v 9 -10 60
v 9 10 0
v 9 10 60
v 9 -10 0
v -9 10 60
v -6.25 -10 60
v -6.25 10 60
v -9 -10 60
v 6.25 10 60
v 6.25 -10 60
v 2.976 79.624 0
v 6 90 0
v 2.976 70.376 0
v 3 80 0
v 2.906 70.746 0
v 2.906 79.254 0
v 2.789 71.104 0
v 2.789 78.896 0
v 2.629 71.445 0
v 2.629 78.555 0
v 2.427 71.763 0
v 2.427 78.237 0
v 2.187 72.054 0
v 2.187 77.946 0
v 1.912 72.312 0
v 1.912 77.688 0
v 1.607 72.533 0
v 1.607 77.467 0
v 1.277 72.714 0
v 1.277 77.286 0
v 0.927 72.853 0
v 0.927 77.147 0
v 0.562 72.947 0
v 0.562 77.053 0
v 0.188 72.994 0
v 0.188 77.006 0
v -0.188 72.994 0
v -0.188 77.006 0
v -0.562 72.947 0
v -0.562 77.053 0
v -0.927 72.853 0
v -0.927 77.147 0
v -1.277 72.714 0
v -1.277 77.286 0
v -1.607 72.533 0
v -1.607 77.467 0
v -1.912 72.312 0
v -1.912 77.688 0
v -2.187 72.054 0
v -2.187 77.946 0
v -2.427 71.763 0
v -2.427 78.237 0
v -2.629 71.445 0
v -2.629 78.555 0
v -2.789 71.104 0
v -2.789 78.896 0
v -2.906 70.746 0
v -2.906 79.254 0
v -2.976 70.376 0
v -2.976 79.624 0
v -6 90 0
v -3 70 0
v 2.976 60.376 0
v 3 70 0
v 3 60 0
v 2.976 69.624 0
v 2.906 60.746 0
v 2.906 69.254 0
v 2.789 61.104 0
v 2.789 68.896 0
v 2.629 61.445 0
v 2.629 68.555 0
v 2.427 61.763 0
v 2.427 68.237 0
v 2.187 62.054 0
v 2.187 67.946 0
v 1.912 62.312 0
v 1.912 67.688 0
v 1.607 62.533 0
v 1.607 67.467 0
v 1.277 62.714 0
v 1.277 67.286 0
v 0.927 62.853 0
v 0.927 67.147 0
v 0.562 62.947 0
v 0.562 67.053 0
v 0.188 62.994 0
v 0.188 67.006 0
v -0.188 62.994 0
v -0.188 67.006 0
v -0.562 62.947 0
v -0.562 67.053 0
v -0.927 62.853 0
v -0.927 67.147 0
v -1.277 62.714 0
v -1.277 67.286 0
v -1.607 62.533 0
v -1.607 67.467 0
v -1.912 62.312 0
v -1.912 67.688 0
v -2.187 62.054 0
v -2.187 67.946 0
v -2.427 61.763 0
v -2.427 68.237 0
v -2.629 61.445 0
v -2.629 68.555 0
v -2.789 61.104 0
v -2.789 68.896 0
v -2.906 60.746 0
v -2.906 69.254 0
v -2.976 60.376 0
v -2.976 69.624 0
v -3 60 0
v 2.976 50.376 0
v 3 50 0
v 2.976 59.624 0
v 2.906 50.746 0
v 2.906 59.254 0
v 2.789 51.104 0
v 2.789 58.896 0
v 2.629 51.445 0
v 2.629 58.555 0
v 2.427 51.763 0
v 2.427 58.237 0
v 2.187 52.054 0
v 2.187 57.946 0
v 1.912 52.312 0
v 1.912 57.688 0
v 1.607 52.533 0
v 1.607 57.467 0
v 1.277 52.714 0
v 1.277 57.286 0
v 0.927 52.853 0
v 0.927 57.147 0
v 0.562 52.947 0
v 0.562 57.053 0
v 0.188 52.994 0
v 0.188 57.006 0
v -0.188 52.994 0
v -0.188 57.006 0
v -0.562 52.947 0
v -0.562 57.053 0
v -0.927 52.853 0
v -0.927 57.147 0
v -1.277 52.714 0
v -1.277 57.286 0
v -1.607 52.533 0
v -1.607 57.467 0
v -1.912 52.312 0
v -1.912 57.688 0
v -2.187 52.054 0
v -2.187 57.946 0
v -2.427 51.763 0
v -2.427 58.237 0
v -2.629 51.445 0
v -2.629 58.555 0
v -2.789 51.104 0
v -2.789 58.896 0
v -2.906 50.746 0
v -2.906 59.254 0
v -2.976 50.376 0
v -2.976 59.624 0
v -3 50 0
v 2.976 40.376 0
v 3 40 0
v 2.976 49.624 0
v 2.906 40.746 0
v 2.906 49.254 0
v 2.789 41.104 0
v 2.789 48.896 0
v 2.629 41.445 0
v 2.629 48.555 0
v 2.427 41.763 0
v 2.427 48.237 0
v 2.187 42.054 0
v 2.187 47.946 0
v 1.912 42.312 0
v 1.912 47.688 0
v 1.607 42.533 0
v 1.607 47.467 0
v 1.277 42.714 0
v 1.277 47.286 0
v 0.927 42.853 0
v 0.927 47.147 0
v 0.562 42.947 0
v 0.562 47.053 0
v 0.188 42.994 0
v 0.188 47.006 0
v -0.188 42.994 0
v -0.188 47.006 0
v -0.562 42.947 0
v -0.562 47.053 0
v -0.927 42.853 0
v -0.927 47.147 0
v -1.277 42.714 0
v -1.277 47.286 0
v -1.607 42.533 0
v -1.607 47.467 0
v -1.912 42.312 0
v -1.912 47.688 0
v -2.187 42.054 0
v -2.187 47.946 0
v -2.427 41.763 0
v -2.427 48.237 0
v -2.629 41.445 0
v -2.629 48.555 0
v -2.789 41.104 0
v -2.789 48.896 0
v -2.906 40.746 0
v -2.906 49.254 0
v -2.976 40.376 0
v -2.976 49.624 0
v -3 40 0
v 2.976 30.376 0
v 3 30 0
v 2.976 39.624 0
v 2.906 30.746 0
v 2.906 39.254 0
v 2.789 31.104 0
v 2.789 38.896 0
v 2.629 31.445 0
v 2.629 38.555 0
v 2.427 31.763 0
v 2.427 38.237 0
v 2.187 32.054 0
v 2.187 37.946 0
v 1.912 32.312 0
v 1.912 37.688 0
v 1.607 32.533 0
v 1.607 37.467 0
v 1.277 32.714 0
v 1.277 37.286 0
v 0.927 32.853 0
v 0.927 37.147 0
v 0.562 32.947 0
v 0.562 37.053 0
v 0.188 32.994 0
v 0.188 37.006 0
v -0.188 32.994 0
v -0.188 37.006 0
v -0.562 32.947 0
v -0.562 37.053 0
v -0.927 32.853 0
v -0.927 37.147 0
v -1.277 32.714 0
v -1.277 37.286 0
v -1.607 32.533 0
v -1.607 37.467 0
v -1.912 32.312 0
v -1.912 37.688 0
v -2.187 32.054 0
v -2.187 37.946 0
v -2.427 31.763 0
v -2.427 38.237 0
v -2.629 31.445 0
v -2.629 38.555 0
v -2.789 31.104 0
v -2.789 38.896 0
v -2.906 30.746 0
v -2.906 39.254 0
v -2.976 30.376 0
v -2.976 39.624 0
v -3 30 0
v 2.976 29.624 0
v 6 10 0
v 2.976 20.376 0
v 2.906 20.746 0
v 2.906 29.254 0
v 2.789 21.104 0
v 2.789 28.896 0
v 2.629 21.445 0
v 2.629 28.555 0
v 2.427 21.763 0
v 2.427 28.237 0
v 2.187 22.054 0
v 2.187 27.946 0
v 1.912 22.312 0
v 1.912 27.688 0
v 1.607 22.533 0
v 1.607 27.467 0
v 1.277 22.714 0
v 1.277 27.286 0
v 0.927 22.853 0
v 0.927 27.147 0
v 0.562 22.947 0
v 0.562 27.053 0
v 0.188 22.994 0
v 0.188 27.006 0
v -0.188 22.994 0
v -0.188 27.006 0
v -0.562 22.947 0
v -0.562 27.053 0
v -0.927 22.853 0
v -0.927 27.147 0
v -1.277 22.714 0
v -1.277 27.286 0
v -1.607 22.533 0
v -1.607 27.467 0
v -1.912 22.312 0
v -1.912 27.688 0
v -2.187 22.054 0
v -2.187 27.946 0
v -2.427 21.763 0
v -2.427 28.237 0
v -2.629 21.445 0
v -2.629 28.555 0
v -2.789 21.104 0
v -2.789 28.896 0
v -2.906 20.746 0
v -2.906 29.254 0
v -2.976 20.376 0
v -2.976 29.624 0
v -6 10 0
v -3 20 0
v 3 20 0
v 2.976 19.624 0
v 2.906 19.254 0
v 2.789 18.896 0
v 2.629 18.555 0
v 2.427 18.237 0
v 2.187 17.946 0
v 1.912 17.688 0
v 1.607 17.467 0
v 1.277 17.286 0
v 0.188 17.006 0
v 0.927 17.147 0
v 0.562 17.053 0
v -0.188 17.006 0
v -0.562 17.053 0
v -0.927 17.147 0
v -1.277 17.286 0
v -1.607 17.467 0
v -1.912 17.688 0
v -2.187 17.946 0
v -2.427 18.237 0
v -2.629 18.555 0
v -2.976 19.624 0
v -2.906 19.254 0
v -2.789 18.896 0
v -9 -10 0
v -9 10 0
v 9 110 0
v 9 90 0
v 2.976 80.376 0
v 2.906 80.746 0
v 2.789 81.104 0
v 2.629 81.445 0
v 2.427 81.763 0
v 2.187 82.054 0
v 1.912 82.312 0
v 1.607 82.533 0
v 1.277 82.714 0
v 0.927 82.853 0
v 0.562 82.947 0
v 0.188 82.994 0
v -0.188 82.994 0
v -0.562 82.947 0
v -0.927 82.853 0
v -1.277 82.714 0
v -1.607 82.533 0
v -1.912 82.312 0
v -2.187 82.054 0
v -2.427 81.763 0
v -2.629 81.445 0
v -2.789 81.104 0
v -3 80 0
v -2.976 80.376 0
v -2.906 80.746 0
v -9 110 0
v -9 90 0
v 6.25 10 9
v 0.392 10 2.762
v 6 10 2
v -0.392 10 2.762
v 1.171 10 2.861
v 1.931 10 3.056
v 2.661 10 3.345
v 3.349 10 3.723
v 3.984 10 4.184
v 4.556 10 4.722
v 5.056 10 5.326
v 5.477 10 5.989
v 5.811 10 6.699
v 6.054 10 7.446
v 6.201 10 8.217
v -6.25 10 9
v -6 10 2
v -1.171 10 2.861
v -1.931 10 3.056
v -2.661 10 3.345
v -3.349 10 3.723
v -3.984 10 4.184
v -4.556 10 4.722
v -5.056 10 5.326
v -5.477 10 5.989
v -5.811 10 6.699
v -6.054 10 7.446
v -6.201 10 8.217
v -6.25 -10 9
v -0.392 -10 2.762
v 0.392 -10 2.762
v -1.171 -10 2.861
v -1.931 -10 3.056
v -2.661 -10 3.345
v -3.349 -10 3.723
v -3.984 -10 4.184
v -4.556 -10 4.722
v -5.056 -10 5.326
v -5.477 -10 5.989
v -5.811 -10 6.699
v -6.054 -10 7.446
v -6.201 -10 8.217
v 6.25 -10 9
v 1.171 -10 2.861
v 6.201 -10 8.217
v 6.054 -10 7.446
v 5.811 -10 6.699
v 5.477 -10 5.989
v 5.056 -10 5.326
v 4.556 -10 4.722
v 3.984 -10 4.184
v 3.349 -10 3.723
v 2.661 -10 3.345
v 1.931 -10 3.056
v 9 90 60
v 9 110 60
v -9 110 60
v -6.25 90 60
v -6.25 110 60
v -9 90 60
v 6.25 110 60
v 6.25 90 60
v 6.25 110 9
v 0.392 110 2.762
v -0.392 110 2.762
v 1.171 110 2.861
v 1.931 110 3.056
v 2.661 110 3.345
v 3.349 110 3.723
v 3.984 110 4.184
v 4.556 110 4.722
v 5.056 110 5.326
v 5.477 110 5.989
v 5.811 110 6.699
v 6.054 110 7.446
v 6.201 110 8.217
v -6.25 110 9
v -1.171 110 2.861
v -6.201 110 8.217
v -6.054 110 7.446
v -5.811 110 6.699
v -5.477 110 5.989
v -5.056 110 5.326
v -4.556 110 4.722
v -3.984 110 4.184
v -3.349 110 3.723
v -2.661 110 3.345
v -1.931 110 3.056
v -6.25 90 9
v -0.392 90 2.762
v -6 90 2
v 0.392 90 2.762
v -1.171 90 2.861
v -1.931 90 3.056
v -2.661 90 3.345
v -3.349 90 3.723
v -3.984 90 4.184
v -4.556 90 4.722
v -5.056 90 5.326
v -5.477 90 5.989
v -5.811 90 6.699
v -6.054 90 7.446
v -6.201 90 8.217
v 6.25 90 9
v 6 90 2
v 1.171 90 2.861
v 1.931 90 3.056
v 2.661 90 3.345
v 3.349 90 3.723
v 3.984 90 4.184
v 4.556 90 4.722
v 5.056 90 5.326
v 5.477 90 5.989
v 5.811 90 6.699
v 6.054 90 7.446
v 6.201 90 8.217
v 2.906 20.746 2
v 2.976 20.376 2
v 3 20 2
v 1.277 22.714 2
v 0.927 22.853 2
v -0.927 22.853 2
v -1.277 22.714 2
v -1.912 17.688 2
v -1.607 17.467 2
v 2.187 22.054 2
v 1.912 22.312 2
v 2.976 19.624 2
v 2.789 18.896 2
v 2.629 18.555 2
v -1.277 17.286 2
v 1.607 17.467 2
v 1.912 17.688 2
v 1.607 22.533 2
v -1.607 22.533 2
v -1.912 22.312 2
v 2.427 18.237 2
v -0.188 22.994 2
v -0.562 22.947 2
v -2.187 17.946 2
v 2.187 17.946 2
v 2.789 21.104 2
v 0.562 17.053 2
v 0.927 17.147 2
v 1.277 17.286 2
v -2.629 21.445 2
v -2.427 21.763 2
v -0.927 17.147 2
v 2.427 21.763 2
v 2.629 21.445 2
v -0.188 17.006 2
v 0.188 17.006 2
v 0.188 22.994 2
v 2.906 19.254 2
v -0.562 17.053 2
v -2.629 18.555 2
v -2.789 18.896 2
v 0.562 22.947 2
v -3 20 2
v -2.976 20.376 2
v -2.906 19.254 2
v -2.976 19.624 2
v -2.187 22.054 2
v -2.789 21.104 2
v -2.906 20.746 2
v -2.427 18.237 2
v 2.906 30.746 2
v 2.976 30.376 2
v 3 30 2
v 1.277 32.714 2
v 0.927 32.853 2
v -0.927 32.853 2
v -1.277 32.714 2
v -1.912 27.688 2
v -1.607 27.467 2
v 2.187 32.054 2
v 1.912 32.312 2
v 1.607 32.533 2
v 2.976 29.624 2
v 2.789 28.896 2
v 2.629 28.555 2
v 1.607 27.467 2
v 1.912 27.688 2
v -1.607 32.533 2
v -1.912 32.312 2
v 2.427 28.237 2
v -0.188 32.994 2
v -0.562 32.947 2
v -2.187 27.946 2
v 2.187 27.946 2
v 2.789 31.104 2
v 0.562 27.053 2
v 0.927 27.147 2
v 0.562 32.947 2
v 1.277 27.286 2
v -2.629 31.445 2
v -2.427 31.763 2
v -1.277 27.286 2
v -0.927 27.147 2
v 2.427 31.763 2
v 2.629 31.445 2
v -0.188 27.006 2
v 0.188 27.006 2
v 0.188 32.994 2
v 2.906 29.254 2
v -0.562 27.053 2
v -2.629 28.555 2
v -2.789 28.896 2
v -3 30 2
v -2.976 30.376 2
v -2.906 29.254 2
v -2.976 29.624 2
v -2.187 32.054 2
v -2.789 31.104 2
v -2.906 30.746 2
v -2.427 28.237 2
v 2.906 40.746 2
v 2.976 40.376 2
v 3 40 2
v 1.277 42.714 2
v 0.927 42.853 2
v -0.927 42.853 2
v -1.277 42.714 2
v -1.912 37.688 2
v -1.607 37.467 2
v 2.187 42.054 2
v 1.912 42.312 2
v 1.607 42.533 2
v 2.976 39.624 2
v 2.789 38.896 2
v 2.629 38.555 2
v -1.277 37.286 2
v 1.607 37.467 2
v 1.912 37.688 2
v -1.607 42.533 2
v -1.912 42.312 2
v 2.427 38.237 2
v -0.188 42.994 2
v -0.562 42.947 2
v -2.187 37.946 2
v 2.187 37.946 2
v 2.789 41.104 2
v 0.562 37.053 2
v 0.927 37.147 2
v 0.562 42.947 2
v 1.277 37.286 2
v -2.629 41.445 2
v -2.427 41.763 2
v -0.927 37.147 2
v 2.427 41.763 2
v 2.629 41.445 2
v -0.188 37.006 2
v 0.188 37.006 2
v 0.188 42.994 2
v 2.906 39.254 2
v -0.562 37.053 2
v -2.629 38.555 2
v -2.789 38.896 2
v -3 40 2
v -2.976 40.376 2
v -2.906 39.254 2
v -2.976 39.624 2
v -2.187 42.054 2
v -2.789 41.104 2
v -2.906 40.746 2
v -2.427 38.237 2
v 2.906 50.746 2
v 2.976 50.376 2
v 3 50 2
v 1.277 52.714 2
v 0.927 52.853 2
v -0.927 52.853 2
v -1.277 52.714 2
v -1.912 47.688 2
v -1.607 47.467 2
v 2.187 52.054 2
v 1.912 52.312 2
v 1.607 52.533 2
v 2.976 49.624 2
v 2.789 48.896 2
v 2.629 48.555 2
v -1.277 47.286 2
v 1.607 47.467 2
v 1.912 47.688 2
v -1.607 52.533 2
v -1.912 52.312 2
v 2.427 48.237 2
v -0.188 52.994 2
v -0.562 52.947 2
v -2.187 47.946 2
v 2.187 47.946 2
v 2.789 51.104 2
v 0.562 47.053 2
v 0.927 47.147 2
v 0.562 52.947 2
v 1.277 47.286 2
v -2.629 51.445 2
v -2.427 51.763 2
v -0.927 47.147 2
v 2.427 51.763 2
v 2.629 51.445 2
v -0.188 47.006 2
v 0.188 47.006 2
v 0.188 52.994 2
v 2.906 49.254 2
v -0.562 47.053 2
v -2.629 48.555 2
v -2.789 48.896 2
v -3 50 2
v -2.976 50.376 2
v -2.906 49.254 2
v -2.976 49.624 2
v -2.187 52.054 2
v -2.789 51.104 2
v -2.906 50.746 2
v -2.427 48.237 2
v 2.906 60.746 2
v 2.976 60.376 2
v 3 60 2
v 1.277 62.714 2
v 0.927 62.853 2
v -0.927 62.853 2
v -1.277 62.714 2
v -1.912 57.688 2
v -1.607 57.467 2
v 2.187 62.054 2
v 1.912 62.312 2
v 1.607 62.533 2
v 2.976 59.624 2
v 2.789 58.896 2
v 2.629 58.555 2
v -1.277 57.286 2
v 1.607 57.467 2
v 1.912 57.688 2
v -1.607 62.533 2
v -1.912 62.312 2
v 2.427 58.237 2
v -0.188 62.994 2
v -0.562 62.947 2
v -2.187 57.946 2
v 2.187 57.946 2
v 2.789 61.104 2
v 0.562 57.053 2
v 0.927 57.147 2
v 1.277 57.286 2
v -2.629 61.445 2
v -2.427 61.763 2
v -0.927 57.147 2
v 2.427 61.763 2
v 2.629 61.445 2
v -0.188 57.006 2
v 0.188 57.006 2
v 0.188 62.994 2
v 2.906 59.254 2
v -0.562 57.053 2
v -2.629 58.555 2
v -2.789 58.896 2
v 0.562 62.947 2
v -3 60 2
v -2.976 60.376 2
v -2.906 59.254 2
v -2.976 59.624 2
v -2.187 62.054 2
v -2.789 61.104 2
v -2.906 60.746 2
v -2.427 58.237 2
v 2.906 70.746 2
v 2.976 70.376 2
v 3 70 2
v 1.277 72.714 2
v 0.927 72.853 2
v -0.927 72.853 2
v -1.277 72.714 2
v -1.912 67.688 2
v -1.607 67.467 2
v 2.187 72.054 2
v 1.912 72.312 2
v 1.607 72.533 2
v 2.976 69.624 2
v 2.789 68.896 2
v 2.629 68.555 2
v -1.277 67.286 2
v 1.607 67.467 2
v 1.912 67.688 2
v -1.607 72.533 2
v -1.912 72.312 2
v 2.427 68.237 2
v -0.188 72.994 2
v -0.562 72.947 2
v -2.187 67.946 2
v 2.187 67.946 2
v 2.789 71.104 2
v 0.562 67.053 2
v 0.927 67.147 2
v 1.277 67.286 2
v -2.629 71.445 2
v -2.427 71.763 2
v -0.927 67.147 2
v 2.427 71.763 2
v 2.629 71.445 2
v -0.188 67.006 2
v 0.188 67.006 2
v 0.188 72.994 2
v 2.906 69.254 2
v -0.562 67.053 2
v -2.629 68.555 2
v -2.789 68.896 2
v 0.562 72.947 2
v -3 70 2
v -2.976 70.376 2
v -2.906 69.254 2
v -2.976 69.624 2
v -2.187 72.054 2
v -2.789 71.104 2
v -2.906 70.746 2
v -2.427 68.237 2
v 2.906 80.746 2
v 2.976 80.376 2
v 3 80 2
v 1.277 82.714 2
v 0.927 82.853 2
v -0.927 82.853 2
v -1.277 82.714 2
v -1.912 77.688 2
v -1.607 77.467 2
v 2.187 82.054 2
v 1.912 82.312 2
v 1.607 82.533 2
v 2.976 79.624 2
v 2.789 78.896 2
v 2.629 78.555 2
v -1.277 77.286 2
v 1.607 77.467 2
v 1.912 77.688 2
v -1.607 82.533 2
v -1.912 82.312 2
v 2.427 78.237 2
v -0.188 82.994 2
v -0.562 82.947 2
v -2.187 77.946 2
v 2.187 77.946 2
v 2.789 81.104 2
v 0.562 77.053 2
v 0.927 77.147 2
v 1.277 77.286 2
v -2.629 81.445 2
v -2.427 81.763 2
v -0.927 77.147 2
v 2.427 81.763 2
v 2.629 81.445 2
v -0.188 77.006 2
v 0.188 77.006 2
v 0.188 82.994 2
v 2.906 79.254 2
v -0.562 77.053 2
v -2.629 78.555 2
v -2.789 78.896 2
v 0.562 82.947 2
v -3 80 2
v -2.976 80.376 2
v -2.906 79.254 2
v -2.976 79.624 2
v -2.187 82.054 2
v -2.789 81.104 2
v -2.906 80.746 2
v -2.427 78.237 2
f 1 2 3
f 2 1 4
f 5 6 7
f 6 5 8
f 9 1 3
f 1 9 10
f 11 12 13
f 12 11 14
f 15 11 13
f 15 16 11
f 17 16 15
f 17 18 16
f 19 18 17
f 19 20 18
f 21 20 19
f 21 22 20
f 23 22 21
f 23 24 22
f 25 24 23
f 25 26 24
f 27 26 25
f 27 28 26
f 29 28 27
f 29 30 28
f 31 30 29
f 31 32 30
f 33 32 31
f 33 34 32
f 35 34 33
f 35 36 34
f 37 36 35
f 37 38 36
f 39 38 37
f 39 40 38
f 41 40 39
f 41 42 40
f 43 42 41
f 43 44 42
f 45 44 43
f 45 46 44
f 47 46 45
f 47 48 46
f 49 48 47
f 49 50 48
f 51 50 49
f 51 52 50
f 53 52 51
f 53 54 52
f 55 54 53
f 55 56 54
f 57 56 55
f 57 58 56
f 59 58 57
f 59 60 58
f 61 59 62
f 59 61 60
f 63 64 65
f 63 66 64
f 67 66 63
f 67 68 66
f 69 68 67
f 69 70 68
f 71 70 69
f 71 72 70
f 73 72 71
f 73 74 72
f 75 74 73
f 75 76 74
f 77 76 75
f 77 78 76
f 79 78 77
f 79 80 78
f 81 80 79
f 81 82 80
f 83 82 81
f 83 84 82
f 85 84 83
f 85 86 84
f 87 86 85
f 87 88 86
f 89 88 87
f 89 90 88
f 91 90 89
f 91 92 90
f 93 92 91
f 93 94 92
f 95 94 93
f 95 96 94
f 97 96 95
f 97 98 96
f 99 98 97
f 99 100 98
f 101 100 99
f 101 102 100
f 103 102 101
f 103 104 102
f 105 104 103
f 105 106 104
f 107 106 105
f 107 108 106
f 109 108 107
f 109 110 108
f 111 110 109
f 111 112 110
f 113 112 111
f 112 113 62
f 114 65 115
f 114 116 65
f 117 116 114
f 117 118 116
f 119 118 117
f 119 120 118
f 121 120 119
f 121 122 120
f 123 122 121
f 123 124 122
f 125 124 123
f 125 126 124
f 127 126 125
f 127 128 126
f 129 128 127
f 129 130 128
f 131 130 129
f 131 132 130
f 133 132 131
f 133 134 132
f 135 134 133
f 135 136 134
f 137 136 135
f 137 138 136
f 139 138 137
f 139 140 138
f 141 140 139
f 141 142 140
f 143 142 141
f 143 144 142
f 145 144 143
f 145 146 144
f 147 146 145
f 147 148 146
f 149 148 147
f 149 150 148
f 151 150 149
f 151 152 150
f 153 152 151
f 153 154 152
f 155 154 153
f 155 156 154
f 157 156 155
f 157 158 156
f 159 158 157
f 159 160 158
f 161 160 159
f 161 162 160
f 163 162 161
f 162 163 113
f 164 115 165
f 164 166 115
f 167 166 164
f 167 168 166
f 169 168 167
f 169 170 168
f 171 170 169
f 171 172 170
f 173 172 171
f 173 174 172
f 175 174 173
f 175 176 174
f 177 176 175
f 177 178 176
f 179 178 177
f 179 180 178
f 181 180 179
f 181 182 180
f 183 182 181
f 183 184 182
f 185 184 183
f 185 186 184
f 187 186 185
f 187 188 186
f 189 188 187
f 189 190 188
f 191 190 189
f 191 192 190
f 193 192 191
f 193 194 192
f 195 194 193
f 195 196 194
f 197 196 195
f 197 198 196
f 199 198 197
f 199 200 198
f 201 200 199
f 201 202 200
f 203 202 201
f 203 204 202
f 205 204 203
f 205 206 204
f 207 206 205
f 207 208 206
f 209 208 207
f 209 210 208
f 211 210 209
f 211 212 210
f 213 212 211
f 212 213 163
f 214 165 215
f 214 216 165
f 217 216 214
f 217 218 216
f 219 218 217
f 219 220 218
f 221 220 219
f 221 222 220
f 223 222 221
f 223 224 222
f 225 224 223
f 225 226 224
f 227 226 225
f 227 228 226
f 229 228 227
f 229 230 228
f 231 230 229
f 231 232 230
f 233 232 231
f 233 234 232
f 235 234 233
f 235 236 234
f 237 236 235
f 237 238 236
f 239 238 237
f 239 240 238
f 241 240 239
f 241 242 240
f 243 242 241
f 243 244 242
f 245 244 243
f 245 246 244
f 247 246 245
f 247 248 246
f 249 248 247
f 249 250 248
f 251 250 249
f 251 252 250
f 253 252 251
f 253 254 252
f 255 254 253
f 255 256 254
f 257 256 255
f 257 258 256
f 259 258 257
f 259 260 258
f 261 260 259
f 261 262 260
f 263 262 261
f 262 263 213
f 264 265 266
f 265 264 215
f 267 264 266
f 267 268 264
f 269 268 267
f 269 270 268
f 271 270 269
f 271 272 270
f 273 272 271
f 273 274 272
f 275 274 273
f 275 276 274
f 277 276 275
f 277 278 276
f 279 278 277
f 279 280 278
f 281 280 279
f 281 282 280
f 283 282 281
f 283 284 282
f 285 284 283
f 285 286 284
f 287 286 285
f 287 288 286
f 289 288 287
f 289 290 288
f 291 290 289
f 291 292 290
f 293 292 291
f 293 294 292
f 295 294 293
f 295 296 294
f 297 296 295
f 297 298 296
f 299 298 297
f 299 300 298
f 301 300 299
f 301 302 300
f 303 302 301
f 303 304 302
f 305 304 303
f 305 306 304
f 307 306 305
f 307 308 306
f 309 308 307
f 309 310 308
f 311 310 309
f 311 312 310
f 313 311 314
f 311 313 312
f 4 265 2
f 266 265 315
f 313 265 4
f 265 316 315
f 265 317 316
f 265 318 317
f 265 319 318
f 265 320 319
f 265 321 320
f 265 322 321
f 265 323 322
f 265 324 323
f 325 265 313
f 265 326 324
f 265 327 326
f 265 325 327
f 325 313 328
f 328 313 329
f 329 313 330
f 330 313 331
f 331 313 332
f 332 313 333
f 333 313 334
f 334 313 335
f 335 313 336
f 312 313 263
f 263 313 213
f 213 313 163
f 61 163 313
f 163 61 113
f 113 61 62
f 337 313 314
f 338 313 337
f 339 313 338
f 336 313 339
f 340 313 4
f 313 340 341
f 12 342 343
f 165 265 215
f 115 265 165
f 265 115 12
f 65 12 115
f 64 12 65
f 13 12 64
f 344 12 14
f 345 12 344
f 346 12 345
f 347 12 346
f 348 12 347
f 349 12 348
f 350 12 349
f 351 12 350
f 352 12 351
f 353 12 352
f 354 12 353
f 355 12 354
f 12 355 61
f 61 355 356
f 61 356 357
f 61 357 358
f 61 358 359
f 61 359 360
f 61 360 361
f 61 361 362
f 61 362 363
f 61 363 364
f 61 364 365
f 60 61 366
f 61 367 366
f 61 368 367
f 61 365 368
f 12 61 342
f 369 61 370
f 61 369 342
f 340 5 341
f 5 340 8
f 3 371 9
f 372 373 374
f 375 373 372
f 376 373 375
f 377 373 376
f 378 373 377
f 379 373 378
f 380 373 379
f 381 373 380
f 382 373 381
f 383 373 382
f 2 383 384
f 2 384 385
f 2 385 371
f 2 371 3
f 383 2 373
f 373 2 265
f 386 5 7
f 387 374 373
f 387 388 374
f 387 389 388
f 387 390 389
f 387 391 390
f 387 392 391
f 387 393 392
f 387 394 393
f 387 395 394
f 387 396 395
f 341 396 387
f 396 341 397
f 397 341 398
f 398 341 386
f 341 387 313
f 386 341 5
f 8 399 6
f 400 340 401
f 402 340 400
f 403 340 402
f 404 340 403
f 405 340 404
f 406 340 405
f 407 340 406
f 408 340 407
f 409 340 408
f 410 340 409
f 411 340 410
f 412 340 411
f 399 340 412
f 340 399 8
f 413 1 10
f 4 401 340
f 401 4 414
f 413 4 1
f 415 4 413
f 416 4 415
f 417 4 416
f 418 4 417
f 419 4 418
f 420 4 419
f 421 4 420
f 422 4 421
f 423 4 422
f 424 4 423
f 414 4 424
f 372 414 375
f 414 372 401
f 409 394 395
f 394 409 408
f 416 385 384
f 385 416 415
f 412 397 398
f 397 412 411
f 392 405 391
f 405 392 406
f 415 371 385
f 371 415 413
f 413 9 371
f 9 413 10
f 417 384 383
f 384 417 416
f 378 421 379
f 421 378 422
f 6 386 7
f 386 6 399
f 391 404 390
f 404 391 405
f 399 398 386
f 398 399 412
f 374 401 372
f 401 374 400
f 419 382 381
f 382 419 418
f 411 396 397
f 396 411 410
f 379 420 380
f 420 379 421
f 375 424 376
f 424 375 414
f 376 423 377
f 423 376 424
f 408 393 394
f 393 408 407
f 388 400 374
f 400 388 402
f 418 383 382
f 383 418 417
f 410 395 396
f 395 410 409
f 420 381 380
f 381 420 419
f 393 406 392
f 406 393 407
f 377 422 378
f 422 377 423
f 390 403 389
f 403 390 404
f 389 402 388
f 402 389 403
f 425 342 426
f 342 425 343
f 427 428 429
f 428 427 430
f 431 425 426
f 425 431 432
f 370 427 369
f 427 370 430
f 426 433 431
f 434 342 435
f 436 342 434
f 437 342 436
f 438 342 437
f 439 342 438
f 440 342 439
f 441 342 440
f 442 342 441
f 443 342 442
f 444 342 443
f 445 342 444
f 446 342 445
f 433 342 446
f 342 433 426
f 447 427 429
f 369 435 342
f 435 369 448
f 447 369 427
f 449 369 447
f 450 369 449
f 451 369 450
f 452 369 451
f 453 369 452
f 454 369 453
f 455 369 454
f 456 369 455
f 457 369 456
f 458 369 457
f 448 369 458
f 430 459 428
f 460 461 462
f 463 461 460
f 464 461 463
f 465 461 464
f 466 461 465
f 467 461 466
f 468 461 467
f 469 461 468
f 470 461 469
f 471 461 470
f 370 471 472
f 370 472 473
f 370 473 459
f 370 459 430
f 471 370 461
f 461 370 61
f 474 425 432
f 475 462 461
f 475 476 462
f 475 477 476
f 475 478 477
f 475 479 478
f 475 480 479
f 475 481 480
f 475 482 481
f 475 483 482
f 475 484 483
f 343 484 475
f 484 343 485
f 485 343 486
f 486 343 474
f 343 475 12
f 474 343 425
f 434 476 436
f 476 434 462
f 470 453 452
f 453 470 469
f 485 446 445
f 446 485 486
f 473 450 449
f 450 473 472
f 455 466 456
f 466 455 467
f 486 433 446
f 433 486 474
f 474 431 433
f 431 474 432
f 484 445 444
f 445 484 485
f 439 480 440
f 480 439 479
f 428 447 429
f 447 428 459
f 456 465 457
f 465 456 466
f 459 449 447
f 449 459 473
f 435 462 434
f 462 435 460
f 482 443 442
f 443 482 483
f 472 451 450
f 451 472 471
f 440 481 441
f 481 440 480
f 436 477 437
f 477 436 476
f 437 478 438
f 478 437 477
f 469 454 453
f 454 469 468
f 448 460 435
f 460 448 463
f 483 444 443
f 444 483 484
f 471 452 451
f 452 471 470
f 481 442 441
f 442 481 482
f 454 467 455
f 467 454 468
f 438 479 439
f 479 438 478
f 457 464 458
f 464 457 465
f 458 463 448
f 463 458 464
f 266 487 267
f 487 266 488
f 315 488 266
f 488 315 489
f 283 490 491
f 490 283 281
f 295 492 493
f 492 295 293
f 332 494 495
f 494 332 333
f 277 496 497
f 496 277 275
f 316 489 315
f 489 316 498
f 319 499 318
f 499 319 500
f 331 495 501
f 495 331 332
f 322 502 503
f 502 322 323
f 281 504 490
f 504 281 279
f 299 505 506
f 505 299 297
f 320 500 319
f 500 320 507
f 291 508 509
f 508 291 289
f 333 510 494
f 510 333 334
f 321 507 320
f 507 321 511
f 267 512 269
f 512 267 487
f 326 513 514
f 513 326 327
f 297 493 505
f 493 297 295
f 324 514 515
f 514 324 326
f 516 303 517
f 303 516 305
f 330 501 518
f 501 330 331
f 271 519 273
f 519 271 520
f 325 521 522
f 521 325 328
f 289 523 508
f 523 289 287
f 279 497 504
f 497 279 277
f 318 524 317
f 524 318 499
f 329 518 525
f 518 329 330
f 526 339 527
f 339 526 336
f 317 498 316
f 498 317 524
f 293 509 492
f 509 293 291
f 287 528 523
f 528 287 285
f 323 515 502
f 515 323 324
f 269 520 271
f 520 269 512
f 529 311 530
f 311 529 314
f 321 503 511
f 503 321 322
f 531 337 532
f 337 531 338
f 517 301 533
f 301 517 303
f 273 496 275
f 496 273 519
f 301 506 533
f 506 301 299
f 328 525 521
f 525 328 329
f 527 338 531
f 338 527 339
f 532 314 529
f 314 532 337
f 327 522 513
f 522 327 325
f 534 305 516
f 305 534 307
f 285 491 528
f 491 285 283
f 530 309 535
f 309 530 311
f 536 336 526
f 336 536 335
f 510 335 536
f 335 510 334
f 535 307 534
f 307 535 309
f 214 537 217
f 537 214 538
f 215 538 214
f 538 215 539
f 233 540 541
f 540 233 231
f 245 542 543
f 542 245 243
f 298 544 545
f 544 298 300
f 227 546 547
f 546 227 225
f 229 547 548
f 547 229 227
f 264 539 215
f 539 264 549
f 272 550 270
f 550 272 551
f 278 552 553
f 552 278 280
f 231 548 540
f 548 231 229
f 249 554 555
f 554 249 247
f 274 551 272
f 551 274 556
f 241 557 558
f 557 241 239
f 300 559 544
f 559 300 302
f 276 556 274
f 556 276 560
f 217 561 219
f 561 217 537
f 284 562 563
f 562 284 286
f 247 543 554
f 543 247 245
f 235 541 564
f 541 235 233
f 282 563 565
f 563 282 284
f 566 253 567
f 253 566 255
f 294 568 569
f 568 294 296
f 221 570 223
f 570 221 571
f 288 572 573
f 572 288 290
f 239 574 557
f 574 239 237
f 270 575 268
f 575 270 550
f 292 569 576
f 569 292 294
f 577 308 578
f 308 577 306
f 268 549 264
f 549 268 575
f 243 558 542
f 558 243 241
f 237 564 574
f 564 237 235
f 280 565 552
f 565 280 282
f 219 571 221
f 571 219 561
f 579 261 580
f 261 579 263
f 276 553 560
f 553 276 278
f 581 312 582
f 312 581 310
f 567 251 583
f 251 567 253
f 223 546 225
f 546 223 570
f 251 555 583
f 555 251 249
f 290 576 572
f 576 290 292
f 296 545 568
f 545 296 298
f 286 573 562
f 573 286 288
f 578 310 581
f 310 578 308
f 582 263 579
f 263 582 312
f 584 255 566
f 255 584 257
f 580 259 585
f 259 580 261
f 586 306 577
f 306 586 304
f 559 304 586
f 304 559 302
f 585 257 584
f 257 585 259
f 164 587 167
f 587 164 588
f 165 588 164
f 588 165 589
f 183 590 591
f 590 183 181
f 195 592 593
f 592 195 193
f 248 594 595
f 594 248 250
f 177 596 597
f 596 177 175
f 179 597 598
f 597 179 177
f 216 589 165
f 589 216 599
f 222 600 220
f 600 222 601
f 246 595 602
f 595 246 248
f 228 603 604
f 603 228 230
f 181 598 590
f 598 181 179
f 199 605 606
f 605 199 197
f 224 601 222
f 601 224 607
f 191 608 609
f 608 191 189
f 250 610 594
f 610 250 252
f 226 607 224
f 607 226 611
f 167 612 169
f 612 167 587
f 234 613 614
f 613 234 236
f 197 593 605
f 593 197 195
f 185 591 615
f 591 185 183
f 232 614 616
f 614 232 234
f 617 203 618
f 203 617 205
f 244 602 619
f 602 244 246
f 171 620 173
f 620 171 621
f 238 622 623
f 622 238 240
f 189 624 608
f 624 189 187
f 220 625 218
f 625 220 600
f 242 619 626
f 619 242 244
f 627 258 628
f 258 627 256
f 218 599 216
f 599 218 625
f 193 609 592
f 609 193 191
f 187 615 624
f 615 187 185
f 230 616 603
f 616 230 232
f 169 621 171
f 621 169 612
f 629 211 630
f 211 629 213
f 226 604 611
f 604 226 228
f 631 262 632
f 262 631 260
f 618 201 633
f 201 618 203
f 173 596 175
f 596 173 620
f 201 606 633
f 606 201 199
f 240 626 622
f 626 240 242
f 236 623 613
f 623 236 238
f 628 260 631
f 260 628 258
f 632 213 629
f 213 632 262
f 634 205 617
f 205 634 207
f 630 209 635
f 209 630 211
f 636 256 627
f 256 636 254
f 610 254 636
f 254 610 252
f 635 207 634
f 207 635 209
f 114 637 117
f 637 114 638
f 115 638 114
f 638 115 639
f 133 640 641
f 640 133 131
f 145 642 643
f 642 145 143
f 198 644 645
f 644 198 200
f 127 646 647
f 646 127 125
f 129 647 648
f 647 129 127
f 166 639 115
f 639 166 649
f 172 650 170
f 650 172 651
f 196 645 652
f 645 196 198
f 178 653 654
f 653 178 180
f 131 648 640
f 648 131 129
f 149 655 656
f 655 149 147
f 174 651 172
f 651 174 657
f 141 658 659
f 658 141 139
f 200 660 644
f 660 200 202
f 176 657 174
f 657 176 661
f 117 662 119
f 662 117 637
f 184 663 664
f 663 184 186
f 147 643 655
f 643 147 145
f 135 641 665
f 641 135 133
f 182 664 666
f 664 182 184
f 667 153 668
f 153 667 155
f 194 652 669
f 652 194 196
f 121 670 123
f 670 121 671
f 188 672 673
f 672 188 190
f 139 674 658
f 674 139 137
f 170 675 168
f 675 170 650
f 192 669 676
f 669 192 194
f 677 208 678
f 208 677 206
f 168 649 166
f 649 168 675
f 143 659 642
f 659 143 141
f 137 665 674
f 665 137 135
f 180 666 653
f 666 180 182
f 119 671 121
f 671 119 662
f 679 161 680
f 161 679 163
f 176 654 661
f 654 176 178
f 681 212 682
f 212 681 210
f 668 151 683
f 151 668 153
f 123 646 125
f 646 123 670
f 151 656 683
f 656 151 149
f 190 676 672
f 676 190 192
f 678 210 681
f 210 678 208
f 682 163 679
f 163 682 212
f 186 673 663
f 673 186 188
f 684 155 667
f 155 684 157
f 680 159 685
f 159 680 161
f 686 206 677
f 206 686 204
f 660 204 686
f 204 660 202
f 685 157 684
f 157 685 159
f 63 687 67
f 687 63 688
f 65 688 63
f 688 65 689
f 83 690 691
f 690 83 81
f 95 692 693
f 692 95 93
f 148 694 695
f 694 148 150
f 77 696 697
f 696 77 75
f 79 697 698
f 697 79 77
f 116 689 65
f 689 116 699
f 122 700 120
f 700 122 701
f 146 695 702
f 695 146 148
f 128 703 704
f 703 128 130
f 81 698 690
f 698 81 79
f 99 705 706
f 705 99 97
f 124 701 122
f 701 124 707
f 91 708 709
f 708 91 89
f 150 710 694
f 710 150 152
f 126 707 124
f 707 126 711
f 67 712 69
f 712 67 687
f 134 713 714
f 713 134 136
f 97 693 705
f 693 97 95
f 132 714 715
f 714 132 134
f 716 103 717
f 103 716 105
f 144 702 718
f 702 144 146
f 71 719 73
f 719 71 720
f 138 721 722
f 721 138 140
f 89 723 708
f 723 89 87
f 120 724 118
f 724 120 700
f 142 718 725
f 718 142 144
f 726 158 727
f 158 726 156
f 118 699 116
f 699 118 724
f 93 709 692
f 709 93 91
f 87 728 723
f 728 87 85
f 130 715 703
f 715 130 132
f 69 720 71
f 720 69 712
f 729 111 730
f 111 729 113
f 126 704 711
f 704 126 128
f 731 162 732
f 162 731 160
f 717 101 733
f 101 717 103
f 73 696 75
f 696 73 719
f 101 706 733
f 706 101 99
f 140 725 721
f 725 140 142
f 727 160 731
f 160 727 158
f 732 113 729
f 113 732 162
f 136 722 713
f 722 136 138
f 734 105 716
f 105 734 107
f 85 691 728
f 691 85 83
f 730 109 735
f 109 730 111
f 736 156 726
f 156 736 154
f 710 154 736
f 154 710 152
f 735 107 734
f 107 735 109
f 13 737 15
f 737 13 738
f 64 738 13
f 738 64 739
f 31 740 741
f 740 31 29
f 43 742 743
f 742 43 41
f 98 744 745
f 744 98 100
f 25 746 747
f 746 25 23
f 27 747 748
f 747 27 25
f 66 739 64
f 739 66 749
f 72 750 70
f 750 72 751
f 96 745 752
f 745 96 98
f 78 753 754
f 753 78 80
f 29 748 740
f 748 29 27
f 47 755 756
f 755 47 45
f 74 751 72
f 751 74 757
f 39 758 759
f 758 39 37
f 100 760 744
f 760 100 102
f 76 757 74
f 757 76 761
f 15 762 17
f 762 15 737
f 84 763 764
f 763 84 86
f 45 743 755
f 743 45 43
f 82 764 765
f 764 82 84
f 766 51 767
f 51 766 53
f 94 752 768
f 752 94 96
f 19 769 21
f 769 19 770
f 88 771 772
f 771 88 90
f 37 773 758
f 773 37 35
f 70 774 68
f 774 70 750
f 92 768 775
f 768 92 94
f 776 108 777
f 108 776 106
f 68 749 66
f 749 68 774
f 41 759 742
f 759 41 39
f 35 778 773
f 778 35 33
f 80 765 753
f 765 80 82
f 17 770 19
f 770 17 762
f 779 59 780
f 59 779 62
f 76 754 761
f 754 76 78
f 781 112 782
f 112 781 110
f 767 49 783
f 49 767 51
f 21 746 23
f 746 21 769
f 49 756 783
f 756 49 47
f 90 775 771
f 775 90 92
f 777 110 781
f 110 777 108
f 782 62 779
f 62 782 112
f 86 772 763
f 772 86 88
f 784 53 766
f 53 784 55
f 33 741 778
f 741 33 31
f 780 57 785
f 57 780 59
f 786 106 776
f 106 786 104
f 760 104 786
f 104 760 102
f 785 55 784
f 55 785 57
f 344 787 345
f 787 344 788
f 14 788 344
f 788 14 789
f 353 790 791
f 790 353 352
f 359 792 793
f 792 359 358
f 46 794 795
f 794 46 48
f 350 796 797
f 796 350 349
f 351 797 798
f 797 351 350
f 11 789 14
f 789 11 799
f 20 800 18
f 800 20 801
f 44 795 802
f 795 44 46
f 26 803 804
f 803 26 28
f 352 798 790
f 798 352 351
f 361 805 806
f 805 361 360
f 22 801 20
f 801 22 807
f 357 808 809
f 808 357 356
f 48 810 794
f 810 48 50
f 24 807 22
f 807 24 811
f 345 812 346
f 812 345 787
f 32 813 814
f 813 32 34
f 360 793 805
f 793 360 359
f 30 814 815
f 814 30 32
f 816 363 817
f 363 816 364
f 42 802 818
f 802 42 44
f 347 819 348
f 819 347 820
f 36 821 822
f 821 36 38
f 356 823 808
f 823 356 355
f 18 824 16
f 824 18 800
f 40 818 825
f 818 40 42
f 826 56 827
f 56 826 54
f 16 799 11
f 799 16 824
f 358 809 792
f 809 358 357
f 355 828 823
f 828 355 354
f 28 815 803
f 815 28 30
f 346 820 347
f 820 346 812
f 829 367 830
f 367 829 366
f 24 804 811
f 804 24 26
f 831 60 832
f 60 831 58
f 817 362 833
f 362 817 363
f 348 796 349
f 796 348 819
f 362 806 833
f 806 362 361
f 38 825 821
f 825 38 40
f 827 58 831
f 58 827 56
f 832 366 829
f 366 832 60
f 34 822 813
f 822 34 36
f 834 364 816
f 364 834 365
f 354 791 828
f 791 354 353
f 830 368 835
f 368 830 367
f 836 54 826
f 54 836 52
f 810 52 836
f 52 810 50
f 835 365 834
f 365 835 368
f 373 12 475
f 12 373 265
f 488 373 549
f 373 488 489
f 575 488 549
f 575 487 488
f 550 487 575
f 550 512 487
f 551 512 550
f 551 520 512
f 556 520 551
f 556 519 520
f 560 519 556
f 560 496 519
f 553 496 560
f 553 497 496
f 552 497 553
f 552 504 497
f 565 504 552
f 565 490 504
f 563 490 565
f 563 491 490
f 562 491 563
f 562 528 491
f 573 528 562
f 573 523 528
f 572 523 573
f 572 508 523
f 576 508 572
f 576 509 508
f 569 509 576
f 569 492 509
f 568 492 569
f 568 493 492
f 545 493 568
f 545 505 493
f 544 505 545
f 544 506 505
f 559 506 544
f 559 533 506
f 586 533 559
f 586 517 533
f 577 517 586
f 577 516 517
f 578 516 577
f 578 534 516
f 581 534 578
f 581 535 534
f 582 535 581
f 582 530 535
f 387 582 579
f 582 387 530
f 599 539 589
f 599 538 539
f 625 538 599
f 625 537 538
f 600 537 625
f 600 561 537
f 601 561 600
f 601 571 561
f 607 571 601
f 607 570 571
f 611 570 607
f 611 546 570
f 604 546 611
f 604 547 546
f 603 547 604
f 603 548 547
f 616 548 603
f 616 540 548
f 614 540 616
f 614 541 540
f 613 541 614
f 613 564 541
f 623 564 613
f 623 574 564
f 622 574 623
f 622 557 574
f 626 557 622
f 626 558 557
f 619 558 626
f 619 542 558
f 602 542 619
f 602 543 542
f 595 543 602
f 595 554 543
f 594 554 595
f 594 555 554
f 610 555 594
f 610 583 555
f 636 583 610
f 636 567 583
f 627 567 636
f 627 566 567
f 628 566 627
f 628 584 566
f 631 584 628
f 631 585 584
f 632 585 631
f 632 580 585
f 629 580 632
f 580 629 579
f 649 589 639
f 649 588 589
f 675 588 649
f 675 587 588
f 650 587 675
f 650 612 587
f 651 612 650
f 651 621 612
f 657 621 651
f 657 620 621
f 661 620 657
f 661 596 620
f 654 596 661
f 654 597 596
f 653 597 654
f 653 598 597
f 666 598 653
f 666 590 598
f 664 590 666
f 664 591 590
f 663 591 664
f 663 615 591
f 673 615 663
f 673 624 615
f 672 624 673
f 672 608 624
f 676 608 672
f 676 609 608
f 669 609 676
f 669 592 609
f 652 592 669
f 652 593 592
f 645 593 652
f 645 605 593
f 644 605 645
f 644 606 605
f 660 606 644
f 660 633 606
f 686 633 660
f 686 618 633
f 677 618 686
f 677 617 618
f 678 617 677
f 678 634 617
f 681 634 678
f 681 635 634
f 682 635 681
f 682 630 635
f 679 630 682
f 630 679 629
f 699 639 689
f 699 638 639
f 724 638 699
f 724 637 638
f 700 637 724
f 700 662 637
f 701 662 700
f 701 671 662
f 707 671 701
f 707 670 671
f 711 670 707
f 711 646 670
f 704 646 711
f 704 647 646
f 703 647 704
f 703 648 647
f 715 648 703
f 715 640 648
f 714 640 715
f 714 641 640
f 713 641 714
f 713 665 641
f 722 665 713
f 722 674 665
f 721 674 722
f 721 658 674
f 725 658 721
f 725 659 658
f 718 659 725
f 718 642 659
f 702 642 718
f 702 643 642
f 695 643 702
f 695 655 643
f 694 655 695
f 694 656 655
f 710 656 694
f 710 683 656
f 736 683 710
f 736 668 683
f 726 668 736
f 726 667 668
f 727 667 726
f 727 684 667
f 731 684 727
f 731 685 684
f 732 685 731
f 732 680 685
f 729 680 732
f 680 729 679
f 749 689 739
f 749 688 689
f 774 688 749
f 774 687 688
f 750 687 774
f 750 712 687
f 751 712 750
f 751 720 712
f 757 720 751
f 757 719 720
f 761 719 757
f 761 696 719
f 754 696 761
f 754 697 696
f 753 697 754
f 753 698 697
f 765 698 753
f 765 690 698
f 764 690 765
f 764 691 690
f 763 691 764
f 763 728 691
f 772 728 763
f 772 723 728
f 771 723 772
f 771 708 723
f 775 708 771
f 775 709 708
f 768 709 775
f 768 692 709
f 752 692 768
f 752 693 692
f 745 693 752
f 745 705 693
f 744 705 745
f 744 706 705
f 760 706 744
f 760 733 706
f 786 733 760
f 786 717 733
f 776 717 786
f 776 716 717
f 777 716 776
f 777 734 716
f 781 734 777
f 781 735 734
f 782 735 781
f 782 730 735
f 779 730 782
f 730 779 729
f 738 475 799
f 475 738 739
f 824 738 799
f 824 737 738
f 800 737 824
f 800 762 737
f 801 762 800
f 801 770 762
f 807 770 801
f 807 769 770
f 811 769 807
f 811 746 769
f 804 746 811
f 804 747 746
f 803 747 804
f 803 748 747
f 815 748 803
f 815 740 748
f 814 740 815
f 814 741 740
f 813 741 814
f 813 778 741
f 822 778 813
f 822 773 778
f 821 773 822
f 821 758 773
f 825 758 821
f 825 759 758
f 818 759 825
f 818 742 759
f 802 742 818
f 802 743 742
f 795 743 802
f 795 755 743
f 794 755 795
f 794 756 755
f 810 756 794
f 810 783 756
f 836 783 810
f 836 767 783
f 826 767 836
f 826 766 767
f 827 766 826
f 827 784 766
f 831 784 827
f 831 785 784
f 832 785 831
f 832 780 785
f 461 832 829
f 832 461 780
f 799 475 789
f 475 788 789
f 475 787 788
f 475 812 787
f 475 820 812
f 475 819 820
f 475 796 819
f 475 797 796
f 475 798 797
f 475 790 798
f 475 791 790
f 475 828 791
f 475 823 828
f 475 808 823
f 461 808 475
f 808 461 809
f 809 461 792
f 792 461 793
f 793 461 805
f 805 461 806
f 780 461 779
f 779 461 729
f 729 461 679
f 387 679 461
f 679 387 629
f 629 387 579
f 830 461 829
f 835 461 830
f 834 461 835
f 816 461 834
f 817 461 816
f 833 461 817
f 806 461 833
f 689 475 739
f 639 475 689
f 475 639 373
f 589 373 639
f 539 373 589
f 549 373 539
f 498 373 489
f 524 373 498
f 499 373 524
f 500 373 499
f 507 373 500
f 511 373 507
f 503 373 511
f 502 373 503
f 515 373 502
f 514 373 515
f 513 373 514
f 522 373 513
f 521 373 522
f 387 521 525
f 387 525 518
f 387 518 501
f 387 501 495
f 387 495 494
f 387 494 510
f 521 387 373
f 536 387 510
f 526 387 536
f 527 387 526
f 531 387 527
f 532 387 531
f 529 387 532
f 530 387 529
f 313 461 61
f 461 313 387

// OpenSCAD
$fn=50;


for(i = [0:1:1]) { 
    translate([0,100*i,0])
    difference() { 
        translate([-9,-10,0]) cube([18, 20, 60]);
        
        #translate([0,0,9])
        hull() {
            rotate([90,0,0]) cylinder(55, 6.25, 6.25, center=true); 
            translate([0,0,60]) rotate([90,0,0])  cylinder(50, 6.25, 6.25, center=true); 
        }
    }
}

difference() {
    translate([-6,0,0]) cube([12,100,2]);
    
    for(i = [0:1:6]) { 
        translate([0, 20 + 10*i, -10]) cylinder(30, 3, 3);
    }
}
